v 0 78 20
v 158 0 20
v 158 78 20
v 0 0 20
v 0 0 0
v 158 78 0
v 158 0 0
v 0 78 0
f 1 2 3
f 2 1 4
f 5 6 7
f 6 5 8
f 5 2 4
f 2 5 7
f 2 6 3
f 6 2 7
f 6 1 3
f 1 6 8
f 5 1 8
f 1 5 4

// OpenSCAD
led_x = 160;
led_y = 80;
base_obj_z = 20;
cube([led_x-2,led_y-2, base_obj_z]);
